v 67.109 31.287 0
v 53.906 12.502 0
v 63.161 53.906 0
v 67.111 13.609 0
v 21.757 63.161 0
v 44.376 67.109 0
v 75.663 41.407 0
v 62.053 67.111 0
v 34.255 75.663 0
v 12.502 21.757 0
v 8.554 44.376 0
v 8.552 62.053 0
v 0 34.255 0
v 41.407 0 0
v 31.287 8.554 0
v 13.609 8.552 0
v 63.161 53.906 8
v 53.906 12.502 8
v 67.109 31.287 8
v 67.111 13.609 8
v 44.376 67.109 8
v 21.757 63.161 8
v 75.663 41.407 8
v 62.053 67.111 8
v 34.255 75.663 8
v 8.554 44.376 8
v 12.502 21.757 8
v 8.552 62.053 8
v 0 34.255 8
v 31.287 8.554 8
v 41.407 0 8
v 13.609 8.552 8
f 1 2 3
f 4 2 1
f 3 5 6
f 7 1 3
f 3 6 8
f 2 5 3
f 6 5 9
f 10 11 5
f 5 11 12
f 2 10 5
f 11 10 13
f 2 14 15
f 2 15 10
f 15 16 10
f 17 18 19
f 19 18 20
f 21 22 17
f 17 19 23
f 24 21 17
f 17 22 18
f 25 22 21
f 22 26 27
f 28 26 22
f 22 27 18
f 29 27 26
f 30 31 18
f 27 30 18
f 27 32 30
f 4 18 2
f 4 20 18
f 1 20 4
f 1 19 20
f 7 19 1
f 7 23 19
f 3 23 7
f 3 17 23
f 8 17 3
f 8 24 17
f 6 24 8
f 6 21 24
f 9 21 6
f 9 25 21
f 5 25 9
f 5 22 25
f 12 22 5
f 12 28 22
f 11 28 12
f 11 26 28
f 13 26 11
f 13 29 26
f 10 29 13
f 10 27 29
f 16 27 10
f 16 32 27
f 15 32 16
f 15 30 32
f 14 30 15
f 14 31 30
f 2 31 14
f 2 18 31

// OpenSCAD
$fn = 32;

// ----------------------------------------------------------------------
// Chain sprocket: 8 teeth, 30 mm root radius
// ----------------------------------------------------------------------

// --- parameters (mm) ---
profile_height = 8;       // extrusion height
profile_points = 16;      // points of the closed outline

profile = [[67.109, 31.287], [75.663, 41.407], [63.161, 53.906], [62.053, 67.111], [44.376, 67.109], [34.255, 75.663], [21.757, 63.161], [8.552, 62.053], [8.554, 44.376], [0, 34.255], [12.502, 21.757], [13.609, 8.552], [31.287, 8.554], [41.407, 0], [53.906, 12.502], [67.111, 13.609]];  // single closed polygon, 16 points, counter clockwise

// --- the one profile operation ---
linear_extrude(height = profile_height) polygon(points = profile);
